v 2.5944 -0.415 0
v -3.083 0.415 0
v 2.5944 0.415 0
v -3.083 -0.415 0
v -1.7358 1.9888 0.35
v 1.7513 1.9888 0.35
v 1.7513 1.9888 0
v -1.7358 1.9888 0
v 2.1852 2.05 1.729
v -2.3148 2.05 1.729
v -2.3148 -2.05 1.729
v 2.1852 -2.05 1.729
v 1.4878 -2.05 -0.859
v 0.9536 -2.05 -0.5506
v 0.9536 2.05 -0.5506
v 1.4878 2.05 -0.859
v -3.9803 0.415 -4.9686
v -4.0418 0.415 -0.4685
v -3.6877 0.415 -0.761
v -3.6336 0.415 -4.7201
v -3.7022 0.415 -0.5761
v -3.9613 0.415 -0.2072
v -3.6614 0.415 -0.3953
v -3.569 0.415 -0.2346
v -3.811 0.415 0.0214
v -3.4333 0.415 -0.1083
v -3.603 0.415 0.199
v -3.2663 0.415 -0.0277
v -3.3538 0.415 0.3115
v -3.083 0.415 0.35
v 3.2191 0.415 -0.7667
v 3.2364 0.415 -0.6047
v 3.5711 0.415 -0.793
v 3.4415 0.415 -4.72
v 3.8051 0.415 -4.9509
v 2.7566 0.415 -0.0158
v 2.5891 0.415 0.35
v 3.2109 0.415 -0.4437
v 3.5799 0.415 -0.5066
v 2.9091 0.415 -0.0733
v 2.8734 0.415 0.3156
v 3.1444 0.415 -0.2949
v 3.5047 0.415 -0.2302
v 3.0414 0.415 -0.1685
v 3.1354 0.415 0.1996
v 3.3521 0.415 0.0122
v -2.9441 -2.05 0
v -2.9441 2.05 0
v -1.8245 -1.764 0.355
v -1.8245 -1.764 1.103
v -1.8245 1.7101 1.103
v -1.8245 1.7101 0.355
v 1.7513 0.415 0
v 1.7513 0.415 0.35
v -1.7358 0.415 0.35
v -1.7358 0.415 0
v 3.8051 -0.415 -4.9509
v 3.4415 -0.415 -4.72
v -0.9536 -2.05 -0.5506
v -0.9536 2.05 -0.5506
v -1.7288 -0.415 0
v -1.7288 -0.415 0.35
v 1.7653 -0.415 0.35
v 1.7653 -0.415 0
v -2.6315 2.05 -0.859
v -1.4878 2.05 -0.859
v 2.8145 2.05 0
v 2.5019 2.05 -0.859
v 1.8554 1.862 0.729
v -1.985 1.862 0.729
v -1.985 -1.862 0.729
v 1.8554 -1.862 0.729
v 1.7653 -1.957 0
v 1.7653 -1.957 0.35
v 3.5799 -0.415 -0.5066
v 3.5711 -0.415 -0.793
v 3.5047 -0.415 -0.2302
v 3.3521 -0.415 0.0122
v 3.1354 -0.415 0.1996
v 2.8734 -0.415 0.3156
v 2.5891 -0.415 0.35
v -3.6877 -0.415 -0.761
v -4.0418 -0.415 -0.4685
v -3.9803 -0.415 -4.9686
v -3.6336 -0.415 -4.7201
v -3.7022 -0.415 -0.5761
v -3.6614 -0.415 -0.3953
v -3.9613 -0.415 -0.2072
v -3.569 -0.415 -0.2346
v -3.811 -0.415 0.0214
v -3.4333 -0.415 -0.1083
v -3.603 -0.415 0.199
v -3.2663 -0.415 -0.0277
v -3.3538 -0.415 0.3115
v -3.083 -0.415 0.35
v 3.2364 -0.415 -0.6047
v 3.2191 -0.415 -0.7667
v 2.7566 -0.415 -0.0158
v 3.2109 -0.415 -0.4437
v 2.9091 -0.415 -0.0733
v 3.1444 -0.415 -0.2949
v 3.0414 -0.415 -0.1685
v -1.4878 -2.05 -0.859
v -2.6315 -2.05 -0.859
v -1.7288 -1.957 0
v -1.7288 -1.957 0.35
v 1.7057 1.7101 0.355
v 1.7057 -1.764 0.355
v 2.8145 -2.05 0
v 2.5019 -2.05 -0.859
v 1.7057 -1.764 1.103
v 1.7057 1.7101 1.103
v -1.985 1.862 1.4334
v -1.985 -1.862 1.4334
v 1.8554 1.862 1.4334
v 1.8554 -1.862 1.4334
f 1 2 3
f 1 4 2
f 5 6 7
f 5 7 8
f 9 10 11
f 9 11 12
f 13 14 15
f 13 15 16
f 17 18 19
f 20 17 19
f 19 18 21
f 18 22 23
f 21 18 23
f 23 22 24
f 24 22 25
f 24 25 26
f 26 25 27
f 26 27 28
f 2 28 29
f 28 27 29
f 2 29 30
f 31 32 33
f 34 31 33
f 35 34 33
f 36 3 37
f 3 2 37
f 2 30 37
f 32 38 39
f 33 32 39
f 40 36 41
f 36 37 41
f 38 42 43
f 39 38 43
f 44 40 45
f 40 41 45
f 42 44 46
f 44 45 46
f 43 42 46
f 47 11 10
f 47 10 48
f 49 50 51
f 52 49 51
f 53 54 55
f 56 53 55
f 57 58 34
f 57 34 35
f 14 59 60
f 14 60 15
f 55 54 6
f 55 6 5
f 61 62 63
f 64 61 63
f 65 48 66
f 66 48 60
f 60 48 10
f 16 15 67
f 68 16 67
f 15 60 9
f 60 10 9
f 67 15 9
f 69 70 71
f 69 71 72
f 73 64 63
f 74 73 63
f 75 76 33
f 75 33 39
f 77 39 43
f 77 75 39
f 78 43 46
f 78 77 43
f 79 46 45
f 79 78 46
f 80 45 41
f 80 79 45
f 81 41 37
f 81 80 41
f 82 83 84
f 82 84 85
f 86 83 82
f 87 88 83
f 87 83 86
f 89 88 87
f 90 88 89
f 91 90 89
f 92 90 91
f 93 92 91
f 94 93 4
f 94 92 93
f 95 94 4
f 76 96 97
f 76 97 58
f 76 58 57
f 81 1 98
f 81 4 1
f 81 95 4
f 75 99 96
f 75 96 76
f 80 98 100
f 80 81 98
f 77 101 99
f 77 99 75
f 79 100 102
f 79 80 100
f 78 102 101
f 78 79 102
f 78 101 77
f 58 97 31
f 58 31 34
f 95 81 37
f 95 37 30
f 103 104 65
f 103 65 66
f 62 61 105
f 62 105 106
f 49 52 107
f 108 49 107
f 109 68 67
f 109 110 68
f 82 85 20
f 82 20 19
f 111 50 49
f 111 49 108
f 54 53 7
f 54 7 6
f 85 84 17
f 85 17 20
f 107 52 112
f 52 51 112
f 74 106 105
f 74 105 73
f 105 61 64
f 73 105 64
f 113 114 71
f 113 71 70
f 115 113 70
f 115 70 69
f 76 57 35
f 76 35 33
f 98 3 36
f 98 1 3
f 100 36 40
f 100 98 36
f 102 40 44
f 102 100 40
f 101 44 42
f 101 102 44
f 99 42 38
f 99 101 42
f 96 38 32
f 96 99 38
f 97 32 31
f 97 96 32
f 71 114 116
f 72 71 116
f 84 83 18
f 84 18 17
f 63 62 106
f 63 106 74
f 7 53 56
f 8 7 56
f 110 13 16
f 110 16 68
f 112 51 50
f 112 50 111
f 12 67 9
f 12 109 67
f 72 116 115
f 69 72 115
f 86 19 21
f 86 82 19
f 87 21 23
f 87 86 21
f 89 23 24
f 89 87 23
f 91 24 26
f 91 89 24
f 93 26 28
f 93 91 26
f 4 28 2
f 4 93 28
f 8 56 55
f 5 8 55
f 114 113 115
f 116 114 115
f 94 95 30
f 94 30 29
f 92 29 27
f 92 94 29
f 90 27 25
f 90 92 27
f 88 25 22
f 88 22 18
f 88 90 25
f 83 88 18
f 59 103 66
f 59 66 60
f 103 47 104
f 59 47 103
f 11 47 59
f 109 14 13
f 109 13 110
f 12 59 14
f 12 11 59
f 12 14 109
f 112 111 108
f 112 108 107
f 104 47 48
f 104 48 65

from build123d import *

# Parameters (mm, degrees)
F1_DEPTH  = 2.05
F3_DEPTH  = 0.415
F4_W      = 3.8403489144
F4_H      = 3.724045353
F5_DEPTH  = 1
F6_W      = 3.4870769596
F6_H      = 0.35
F7_DEPTH  = 1.57382
F8_W      = 3.4941060003
F8_H      = 0.35
F9_DEPTH  = 1.54205
F10_W     = 3.5302189644
F10_H     = 3.4740566043
F11_DEPTH = 0.37396
F12_W     = 3.8403489144
F12_H     = 0.2955522308
F13_DEPTH = 3.724045353


with BuildPart() as f1:
    # F0 (on Front) → F1 (new body, symmetric)
    with BuildSketch(Plane.XZ):
        Polygon((2.1852144086, 1.7290017953), (-2.3147855914, 1.7290017953), (-2.9440907799, 0), (-2.631453128, -0.8589648891), (-1.4877708299, -0.8589648891), (-0.9536180938, -0.5505716632), (0.9536180938, -0.5505716632), (1.4877708299, -0.8589648891), (2.5018819451, -0.8589648891), (2.8145195971, 0), align=None)
    extrude(amount=F1_DEPTH, both=True)

    # F4 (on face) → F5 (cut)
    with BuildSketch(Plane.XY.offset(1.7290017953)):
        with Locations((-0.0647855914, 0)):
            Rectangle(F4_W, F4_H)
    extrude(amount=-F5_DEPTH, mode=Mode.SUBTRACT)

    # F12 (on face) → F13 (join, through all)
    with BuildSketch(Plane.XZ.offset(-1.8620226765)):
        with Locations((-0.0647855914, 1.5812256799)):
            Rectangle(F12_W, F12_H)
    extrude(amount=F13_DEPTH)


with BuildPart() as f3:
    # F2 (on Front) → F3 (new body, symmetric)
    with BuildSketch(Plane.XZ):
        with BuildLine():
            ThreePointArc((2.5944073658, 0), (3.0970502608, -0.2283073486), (3.2190639405, -0.7667187037))
            Line((3.2190639405, -0.7667187037), (3.4415388399, -4.72))
            Line((3.4415388399, -4.72), (3.8050862517, -4.9508910426))
            Line((3.8050862517, -4.9508910426), (3.5710944592, -0.7929596136))
            ThreePointArc((3.5710944592, -0.7929596136), (3.3520943466, 0.0122444512), (2.5890505572, 0.35))
            Line((2.5890505572, 0.35), (2.5944073658, 0))
        make_face()
        Polygon((-3.0830035941, 0), (2.5944073658, 0), (2.5890505572, 0.35), (-3.0830035941, 0.35), align=None)
        with BuildLine():
            ThreePointArc((-3.6877330381, -0.7609760948), (-3.5690031613, -0.234557842), (-3.0830035941, 0))
            Line((-3.0830035941, 0), (-3.0830035941, 0.35))
            ThreePointArc((-3.0830035941, 0.35), (-3.7133207197, 0.1175353104), (-4.0417610478, -0.4685248073))
            Line((-4.0417610478, -0.4685248073), (-3.9802822739, -4.968643482))
            Line((-3.9802822739, -4.968643482), (-3.6336445253, -4.7201429922))
            Line((-3.6336445253, -4.7201429922), (-3.6877330381, -0.7609760948))
        make_face()
    extrude(amount=F3_DEPTH, both=True)


with BuildPart() as f7:
    # F6 (on face) → F7 (new body)
    with BuildSketch(Plane(origin=(0, 0.415, 0), x_dir=(-1, 0, 0), z_dir=(0, 1, 0))):
        with Locations((-0.0077152508, 0.175)):
            Rectangle(F6_W, F6_H)
    extrude(amount=F7_DEPTH)


with BuildPart() as f9:
    # F8 (on face) → F9 (new body)
    with BuildSketch(Plane.XZ.offset(0.415)):
        with Locations((0.018295832, 0.175)):
            Rectangle(F8_W, F8_H)
    extrude(amount=F9_DEPTH)


with BuildPart() as f11:
    # F10 (on face) → F11 (new body, symmetric)
    with BuildSketch(Plane.XY.offset(0.7290017953)):
        with Locations((-0.0594346784, -0.026947062)):
            Rectangle(F10_W, F10_H)
    extrude(amount=F11_DEPTH, both=True)


solid = Compound([f1.part, f3.part, f7.part, f9.part, f11.part])
